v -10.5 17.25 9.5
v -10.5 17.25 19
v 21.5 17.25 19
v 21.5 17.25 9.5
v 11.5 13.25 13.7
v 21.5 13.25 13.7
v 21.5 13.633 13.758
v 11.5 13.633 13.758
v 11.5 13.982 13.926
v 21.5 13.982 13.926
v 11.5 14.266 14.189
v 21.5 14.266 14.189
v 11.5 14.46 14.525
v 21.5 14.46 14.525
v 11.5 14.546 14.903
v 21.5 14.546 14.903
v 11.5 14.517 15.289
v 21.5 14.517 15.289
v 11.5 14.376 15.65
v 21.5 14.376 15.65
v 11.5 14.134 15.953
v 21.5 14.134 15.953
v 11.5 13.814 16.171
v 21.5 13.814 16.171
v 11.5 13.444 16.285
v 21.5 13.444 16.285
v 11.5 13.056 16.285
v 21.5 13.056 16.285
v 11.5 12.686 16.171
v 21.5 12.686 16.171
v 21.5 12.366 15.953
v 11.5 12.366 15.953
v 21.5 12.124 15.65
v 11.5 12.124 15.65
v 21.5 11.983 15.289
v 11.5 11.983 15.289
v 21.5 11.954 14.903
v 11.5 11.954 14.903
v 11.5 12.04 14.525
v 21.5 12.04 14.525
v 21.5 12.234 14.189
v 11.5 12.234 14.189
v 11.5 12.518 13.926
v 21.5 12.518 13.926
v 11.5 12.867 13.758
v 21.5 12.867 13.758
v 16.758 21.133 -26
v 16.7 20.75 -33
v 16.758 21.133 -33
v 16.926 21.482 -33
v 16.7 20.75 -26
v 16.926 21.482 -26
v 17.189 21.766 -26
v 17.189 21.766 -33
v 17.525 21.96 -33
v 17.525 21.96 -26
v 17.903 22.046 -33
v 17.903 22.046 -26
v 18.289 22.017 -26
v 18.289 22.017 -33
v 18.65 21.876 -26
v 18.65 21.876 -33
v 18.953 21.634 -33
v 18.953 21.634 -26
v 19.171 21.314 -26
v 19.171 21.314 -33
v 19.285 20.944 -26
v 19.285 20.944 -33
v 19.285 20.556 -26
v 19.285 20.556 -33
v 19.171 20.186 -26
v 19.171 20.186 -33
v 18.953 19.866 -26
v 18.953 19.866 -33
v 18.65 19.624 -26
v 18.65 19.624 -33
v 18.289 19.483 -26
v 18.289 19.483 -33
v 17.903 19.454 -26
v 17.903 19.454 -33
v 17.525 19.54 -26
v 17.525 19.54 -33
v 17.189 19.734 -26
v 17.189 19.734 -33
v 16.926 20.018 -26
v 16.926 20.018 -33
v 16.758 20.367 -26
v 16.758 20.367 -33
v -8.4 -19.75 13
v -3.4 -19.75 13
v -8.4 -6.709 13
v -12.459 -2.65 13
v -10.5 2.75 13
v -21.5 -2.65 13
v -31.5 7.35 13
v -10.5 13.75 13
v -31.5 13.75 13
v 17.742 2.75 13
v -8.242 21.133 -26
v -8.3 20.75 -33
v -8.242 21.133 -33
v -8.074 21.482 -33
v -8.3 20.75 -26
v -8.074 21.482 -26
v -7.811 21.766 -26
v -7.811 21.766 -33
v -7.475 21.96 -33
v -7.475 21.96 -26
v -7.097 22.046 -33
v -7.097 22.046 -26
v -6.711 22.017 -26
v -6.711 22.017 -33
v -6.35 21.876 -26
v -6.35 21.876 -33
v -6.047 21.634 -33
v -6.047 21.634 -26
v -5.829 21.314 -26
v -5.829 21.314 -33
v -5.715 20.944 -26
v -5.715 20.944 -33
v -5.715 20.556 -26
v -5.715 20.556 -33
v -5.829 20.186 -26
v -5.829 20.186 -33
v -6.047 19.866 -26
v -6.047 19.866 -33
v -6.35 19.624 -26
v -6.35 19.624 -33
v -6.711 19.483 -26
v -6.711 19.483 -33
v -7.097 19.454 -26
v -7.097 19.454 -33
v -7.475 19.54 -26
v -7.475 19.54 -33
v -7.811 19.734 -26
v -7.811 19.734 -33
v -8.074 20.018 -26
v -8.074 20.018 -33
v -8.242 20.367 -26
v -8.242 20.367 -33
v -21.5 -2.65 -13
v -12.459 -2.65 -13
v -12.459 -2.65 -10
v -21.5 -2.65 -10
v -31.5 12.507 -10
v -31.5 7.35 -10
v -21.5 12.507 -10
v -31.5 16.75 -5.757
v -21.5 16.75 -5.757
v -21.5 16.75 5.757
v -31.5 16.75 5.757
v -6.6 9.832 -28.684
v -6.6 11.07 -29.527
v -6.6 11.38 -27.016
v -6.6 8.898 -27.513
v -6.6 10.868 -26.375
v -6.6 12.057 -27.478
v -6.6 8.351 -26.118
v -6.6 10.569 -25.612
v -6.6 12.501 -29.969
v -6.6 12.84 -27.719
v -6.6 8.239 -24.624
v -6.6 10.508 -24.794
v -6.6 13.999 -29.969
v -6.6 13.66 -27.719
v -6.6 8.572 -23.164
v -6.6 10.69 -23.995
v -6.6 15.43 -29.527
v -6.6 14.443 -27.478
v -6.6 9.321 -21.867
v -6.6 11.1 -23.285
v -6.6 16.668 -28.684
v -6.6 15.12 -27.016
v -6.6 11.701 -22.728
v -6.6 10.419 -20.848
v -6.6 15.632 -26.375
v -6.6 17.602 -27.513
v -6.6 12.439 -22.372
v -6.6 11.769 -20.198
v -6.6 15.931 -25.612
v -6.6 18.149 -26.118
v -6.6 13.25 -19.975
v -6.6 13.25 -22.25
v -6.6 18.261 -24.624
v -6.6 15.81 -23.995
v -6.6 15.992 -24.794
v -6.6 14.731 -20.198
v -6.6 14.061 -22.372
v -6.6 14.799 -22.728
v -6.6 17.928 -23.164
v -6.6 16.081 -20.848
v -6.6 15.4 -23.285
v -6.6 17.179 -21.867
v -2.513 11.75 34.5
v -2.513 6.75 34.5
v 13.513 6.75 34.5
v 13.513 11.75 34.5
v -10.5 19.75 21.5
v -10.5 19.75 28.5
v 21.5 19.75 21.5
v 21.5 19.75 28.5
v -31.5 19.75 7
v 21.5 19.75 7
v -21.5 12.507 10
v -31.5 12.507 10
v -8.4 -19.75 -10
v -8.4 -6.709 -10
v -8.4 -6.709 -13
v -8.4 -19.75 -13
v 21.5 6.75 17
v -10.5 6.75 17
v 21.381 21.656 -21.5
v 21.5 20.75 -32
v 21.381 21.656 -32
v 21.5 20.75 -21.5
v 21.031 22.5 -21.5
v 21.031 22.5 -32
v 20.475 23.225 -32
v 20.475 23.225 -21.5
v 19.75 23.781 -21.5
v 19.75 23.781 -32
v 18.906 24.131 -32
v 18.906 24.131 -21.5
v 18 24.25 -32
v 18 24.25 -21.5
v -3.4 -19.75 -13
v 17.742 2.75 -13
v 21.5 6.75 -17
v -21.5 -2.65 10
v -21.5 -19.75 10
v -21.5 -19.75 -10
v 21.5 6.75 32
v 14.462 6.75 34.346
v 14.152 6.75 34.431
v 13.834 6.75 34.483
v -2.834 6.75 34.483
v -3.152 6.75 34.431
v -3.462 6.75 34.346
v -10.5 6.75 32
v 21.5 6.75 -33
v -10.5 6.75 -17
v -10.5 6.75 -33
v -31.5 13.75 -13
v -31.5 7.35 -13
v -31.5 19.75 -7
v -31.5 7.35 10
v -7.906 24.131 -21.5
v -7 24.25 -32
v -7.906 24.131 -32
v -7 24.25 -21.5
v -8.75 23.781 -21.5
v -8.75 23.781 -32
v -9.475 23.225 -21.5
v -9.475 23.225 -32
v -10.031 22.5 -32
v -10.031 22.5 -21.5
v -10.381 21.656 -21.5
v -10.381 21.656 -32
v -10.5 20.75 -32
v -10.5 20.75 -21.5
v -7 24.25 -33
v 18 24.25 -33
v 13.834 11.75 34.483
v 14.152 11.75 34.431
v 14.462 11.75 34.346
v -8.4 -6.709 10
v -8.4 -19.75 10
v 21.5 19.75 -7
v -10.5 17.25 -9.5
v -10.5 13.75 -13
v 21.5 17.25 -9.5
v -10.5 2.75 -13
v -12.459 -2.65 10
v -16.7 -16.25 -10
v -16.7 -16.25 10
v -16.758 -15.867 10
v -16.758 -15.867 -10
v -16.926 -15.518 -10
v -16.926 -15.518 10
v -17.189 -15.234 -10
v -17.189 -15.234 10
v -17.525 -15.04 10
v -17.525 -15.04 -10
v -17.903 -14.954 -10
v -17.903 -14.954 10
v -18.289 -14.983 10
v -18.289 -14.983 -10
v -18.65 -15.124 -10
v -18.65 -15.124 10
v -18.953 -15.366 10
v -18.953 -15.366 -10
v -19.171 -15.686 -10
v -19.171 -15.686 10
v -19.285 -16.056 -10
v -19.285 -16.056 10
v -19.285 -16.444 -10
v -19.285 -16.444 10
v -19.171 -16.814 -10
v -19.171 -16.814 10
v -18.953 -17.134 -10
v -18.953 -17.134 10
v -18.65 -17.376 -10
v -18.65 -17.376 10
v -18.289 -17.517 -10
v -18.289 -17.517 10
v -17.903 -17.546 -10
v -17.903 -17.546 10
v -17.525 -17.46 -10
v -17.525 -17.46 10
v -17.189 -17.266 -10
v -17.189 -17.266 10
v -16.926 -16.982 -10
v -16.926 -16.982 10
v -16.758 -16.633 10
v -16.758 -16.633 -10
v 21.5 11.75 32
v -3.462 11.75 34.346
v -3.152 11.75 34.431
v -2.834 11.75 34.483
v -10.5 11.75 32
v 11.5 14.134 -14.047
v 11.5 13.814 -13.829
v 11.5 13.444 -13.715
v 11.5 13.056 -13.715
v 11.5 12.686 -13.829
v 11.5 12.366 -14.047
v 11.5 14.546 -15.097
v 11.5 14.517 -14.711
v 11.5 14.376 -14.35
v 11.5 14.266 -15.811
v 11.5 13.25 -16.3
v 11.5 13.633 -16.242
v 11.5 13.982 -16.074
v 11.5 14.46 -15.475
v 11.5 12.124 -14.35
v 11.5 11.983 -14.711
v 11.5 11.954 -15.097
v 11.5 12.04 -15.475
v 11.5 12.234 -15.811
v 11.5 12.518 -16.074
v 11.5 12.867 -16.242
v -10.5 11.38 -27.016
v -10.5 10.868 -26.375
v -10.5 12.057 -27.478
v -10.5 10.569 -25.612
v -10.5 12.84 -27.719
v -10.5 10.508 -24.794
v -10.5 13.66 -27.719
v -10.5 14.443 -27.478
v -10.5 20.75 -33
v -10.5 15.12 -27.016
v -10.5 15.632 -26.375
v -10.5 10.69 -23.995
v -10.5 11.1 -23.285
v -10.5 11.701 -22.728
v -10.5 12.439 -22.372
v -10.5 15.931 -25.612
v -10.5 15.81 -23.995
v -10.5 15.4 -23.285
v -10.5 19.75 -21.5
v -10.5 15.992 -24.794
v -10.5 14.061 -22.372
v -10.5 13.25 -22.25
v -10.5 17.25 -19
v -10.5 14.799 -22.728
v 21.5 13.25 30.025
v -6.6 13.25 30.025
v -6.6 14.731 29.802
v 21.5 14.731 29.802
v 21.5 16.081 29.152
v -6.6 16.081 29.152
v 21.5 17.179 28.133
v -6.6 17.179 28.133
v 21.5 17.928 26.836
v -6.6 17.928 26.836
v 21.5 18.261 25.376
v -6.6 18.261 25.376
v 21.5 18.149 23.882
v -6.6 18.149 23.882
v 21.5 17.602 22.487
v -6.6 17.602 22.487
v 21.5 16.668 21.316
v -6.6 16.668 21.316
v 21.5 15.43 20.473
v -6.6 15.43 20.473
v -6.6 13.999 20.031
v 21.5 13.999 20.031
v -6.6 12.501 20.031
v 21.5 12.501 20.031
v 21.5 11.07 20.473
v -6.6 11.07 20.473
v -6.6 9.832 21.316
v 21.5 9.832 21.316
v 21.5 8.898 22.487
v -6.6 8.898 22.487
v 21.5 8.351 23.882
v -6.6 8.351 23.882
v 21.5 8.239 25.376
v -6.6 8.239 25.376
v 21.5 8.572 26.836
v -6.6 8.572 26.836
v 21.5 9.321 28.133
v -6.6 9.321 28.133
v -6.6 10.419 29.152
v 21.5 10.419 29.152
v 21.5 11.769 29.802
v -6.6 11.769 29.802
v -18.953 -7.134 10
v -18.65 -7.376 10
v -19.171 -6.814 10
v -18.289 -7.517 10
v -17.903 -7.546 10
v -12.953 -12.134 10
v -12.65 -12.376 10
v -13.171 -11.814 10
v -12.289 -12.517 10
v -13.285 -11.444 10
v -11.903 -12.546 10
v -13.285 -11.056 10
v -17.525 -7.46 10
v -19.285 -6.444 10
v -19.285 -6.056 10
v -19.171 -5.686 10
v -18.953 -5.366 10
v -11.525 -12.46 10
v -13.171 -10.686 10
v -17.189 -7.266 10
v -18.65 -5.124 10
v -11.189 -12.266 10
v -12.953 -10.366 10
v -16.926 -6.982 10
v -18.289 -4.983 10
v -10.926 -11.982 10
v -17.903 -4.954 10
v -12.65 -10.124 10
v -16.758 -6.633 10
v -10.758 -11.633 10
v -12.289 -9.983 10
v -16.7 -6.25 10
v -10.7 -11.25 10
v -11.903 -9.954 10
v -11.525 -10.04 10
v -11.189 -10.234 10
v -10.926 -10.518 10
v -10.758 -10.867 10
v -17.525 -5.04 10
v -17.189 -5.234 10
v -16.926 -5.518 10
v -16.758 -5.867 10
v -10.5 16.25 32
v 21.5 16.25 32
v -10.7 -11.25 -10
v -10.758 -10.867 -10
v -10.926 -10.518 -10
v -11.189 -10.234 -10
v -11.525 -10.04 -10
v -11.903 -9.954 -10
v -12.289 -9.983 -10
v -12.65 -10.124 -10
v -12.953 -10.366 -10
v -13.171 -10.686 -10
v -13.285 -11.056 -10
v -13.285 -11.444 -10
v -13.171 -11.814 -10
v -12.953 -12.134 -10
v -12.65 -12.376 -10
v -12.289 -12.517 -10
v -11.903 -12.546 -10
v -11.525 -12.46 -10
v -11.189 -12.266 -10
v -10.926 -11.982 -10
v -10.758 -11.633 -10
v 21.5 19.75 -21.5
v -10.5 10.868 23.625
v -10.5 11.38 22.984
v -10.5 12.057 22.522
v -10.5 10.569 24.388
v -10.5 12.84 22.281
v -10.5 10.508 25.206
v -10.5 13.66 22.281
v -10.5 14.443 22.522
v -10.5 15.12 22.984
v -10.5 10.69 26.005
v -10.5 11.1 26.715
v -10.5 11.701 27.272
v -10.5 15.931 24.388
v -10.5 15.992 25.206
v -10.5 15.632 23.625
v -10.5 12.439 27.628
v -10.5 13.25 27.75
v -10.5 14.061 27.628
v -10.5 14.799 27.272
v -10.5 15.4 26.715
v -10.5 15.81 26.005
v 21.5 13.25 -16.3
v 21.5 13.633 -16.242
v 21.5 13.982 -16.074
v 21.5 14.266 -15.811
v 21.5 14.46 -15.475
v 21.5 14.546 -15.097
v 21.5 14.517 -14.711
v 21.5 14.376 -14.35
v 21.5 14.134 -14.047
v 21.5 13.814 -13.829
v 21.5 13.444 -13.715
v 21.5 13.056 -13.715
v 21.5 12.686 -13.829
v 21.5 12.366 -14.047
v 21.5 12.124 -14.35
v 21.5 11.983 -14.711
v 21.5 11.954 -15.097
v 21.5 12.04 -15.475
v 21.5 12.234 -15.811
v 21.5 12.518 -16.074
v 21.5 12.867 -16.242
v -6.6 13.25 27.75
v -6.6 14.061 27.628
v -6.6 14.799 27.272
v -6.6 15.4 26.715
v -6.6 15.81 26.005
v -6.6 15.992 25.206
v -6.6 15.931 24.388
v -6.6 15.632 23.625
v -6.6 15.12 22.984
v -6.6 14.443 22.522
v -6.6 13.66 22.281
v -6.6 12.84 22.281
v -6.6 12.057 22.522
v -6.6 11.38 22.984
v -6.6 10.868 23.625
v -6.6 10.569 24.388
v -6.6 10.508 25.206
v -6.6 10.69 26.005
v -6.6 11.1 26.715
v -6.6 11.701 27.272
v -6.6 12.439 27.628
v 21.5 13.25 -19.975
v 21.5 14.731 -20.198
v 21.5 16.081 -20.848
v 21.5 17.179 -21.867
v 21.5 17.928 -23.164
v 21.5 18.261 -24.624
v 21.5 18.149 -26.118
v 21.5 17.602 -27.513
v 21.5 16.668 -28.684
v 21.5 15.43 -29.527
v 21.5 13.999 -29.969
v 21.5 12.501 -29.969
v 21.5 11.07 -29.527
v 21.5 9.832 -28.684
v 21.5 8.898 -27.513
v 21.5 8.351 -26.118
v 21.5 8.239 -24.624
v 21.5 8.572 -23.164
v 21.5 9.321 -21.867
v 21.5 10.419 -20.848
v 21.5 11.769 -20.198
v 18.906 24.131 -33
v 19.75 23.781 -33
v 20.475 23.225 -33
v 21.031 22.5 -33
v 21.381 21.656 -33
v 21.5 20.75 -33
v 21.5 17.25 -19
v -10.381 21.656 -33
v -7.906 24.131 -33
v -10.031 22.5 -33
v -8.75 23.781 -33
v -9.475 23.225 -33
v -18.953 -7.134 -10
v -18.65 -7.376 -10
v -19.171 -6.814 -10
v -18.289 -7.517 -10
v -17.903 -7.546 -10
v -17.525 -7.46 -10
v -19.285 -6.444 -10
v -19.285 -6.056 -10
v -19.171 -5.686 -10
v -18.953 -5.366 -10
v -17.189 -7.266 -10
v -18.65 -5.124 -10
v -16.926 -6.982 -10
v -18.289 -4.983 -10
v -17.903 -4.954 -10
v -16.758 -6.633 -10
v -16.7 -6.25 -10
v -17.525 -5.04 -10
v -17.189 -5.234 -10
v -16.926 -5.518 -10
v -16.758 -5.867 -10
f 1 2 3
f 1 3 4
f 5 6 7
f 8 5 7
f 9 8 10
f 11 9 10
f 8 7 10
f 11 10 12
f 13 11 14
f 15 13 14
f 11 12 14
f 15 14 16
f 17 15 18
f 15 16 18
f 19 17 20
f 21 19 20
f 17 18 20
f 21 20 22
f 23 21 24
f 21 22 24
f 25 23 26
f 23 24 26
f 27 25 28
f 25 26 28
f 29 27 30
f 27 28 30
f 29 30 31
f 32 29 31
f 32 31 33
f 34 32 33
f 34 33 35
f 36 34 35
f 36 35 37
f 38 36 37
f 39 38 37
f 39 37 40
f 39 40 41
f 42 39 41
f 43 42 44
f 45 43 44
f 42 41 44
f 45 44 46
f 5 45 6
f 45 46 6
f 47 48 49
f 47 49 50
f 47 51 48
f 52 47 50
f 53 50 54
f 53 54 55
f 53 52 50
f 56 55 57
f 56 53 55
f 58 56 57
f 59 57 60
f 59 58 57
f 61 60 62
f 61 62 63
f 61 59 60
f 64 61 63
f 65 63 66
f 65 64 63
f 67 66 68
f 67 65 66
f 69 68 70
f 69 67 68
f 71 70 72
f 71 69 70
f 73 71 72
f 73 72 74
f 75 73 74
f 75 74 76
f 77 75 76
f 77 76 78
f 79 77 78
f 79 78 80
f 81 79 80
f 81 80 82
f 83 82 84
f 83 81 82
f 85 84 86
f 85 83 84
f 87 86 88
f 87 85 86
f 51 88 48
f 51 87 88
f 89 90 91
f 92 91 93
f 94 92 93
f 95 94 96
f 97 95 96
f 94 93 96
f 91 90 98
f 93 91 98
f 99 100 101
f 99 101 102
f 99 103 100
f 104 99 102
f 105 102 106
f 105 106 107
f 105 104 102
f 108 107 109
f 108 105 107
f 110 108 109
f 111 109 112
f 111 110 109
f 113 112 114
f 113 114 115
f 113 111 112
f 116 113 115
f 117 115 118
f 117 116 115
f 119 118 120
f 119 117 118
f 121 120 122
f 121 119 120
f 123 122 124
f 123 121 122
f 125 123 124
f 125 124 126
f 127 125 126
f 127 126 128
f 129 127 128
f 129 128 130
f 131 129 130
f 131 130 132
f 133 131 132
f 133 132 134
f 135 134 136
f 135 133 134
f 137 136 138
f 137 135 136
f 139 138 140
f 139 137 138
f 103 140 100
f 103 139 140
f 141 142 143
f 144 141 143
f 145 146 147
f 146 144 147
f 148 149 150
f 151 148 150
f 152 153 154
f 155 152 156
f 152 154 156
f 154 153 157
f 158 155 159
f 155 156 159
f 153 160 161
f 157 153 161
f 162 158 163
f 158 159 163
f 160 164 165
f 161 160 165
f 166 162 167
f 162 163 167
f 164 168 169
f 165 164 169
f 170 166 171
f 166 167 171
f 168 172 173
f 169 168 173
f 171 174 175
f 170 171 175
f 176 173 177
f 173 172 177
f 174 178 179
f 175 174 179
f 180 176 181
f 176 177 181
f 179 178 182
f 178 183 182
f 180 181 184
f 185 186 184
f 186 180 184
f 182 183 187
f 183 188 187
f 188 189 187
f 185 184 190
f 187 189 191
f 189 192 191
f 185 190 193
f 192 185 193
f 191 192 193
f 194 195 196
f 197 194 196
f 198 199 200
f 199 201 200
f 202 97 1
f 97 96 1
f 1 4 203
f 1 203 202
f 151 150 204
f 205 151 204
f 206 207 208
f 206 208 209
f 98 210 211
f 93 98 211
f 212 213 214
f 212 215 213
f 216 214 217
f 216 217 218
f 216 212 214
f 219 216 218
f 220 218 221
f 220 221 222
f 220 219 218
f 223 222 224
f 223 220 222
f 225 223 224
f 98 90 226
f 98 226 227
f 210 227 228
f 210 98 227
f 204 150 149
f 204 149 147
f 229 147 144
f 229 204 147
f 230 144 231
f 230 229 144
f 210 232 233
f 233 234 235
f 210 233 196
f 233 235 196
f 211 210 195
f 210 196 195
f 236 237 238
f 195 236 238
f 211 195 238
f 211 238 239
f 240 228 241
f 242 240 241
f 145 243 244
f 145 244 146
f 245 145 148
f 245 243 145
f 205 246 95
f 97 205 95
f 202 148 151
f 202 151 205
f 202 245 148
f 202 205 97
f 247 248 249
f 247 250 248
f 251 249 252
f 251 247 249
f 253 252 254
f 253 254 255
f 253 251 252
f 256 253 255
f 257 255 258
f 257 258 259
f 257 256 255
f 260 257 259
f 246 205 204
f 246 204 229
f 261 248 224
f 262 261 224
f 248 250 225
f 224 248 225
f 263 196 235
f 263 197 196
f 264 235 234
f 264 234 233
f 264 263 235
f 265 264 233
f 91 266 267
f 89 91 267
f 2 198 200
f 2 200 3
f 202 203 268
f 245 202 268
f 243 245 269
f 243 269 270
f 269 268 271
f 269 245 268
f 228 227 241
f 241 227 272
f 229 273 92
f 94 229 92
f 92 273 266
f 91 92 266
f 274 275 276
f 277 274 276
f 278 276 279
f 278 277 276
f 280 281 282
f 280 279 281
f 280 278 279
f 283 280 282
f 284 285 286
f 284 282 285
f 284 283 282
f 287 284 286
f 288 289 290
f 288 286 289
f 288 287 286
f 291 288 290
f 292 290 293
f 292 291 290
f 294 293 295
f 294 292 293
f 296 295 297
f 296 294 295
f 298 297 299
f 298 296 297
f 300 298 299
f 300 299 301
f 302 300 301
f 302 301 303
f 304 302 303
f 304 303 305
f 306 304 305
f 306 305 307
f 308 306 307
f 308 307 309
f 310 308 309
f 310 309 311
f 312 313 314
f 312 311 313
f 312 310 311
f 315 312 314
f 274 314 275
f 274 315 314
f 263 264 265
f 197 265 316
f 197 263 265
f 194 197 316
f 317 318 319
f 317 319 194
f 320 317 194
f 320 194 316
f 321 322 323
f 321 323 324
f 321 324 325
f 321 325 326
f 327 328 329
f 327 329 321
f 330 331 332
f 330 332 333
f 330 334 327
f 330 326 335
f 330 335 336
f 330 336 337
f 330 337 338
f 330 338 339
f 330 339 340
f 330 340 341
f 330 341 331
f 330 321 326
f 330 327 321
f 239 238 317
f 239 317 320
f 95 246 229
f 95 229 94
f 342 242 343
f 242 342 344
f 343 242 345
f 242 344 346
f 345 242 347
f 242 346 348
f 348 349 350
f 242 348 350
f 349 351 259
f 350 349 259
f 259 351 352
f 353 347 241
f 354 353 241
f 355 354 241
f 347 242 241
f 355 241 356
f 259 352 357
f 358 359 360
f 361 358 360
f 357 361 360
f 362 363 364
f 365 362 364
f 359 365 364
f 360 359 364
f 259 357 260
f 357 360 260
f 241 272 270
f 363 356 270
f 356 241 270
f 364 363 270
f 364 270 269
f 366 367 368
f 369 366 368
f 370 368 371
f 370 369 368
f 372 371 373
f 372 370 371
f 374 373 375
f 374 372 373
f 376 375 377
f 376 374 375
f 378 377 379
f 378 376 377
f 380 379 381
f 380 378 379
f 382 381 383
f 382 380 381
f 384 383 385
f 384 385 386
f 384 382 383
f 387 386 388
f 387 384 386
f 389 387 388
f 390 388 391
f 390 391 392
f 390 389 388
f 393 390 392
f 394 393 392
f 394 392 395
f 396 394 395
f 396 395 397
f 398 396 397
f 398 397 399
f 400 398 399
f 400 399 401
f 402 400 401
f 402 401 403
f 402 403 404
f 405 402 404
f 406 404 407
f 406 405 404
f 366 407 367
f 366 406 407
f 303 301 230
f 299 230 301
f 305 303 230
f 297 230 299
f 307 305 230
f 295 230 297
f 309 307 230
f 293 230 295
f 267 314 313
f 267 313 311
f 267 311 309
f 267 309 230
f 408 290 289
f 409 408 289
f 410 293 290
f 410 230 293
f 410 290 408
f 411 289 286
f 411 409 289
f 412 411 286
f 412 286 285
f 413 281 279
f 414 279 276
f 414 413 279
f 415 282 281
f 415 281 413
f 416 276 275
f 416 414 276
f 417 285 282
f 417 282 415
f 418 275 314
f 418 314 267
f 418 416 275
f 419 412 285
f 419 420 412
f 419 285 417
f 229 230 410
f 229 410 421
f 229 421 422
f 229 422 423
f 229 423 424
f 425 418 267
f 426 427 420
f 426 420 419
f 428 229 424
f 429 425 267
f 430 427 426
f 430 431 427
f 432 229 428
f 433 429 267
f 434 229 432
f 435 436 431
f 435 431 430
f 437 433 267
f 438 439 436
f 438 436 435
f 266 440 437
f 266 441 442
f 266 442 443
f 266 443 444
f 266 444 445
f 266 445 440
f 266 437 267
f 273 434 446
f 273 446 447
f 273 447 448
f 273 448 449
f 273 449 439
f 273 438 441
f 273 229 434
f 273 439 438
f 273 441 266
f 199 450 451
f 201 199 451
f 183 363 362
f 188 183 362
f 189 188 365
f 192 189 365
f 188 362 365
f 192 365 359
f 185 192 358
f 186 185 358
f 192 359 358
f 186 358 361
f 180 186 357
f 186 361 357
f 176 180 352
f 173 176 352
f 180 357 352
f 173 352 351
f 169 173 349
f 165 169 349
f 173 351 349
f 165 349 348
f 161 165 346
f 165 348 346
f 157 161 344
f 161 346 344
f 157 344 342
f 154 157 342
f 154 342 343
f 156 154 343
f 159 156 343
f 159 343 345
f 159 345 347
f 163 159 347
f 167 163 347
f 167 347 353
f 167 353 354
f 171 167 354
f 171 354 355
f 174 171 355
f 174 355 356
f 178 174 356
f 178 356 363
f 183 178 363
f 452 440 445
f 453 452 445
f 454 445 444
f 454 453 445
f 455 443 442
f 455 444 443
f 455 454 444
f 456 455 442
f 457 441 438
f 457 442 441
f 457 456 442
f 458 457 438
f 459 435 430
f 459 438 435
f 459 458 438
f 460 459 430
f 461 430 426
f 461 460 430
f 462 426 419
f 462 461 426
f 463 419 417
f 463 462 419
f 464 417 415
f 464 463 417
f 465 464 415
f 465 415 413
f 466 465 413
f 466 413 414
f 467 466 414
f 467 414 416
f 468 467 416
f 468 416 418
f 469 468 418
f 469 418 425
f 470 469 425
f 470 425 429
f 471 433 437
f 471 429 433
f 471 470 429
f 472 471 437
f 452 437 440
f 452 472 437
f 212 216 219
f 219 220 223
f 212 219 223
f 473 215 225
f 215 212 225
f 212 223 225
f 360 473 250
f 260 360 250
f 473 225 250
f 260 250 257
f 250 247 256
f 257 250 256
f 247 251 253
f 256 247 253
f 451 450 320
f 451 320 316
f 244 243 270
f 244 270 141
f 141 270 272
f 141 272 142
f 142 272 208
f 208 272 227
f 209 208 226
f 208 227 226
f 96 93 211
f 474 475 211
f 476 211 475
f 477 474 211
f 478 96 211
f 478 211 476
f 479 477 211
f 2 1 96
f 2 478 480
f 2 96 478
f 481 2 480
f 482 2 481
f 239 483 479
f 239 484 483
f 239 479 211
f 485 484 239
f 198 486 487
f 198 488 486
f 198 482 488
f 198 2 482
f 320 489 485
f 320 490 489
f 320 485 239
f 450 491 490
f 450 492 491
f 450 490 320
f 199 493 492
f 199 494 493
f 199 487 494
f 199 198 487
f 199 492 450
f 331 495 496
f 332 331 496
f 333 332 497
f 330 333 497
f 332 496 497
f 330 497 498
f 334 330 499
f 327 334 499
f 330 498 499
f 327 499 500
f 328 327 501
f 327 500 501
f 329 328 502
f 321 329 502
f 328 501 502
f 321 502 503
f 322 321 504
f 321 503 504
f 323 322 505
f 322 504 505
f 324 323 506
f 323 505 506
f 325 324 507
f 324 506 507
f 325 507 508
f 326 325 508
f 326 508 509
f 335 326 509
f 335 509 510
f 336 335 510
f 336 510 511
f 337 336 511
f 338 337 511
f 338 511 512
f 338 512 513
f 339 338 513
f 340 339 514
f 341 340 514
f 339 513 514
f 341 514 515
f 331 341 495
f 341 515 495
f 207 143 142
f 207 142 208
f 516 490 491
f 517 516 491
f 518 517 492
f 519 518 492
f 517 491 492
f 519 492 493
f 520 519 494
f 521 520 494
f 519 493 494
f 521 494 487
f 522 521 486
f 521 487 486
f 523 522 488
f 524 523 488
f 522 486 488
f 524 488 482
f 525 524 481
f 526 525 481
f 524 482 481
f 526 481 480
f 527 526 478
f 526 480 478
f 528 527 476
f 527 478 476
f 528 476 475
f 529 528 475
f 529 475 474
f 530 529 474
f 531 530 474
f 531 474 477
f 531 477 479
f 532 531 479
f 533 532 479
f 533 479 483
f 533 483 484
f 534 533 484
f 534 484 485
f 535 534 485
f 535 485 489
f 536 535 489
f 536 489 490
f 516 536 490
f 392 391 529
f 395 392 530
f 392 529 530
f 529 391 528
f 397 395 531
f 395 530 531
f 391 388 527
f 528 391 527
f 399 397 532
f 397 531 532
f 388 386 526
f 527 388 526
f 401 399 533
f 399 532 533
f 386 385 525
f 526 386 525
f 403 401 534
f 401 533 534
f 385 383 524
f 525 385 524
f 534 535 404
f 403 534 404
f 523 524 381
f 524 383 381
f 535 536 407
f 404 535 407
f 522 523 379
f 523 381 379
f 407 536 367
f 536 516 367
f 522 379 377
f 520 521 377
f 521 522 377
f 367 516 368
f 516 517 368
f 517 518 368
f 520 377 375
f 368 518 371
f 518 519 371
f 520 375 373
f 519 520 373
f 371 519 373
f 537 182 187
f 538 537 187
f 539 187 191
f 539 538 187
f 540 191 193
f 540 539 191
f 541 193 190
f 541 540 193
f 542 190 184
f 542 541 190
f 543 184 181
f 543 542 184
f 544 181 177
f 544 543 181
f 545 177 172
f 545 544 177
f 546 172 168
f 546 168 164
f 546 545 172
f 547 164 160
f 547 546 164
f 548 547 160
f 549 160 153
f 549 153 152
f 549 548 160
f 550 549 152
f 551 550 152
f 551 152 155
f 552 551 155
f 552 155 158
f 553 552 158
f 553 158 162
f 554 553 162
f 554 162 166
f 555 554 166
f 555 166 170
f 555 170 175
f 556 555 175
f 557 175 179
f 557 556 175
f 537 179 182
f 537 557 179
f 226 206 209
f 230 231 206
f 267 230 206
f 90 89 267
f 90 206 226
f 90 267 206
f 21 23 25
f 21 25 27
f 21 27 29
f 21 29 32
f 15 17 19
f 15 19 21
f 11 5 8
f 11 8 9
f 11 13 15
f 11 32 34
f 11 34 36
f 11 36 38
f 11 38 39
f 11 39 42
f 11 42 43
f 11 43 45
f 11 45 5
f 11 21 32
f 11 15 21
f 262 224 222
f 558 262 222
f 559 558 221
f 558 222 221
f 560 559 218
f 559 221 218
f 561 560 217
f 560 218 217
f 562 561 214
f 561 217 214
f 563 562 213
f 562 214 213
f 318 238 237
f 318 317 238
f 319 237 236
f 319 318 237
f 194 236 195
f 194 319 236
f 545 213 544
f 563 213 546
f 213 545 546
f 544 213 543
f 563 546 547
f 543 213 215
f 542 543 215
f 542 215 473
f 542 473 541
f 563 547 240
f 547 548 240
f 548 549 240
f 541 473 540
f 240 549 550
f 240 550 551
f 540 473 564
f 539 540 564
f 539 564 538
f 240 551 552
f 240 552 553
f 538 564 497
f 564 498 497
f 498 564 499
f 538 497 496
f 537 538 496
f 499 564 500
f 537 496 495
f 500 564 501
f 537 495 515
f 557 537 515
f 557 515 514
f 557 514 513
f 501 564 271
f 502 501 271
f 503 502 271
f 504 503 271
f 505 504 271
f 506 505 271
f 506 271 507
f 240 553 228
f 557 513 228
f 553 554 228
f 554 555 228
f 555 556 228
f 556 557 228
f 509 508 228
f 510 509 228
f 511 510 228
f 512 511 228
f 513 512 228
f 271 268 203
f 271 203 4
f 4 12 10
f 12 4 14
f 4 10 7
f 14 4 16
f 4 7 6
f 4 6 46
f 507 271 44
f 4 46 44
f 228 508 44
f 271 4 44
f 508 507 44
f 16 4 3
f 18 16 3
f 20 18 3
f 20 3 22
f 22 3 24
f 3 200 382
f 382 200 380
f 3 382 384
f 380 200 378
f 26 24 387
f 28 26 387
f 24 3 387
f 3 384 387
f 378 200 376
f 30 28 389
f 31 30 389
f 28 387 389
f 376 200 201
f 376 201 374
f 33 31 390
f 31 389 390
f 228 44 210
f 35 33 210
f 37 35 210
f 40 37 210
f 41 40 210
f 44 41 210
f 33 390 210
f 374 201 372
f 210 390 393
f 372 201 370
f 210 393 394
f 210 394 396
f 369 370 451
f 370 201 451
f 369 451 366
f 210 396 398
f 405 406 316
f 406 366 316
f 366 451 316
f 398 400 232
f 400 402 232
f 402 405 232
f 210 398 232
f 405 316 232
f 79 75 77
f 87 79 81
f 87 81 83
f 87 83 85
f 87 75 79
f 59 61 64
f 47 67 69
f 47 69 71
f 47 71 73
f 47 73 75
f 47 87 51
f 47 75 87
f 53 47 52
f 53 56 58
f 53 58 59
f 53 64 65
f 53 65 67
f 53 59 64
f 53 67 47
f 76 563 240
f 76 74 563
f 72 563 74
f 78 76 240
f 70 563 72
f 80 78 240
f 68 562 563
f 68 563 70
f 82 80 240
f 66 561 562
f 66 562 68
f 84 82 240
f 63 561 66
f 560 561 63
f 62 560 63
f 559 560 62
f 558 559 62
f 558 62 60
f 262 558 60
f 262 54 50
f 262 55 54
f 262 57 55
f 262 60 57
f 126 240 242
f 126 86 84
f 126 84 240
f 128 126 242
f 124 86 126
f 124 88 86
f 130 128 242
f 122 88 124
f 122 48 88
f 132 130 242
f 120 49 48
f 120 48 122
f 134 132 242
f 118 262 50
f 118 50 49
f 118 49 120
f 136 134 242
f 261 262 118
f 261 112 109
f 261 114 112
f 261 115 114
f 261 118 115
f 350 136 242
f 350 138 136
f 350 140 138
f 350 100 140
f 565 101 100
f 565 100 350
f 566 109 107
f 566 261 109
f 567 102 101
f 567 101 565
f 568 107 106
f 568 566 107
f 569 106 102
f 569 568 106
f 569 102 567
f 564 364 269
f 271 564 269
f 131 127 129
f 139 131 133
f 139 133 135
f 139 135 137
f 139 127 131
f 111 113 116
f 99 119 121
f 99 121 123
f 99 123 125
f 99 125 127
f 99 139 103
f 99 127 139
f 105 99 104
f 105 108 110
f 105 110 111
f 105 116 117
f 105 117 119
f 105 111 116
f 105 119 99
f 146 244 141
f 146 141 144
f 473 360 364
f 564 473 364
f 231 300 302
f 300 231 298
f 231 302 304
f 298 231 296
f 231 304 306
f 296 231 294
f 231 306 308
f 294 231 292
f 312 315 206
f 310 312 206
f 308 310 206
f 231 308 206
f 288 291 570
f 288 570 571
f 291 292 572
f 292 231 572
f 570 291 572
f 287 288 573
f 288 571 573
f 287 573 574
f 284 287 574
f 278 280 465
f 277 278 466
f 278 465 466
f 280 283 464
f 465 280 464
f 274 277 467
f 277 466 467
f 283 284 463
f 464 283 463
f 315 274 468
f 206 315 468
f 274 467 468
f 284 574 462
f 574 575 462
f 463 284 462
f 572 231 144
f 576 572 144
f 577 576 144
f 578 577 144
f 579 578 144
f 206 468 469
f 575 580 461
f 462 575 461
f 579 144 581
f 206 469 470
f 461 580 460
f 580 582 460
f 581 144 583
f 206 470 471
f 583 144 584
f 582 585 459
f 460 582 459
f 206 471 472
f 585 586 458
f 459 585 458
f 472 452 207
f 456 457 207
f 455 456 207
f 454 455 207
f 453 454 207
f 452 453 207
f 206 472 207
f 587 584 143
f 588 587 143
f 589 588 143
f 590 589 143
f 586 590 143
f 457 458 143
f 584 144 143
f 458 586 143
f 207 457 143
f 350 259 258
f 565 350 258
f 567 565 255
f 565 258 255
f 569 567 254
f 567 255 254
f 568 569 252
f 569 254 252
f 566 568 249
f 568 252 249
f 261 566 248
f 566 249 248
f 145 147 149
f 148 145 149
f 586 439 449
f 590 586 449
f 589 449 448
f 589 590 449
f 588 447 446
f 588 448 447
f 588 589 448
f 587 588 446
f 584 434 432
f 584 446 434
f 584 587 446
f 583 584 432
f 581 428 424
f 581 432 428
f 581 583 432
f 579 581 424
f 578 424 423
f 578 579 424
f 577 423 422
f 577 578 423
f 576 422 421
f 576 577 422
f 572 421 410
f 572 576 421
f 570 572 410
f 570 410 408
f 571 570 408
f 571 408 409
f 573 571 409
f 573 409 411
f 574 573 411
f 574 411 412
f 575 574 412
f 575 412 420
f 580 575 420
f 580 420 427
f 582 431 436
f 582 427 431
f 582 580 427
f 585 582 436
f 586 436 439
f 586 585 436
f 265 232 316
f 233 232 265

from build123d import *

# Parameters (mm, degrees)
SKETCH_1_W               = 43
SKETCH_1_H               = 39.5
EXTRUDE_1_DEPTH          = 10
SKETCH_2_W               = 43
SKETCH_2_H               = 13
EXTRUDE_2_DEPTH          = 32
SKETCH_3_R               = 2.75
CUT_EXTRUDE_4_DEPTH      = 58.123222073
CHAMFER_1_SIZE           = 3.5
CUT_EXTRUDE_3_DEPTH      = 44.316422983
CUT_EXTRUDE_3_DEPTH_BACK = 44.316422983
SKETCH_6_R               = 1.3
EXTRUDE_3_DEPTH          = 3
SKETCH_9_W               = 19
SKETCH_9_H               = 13
CUT_EXTRUDE_6_DEPTH      = 11
CUT_EXTRUDE_7_DEPTH      = 54.640586313
CHAMFER_2_SIZE           = 6
CUT_EXTRUDE_START        = -32
SKETCH_12_R              = 5.025
CUT_EXTRUDE_10_DEPTH     = 28.1
EXTRUDE_4_DEPTH          = 10
CHAMFER_5_SIZE           = 10
CUT_EXTRUDE_11_DEPTH     = 50.376740476
CHAMFER_7_SIZE           = 4
SKETCH_15_R              = 1.3
CUT_EXTRUDE_12_DEPTH     = 10
SKETCH_21_W              = 32
SKETCH_21_H              = 4.5
EXTRUDE_7_DEPTH          = 10.5
SKETCH_21_3_R            = 1.3
CUT_EXTRUDE_15_DEPTH     = 6
FILLET_2_R               = 3.5
SKETCH_22_R              = 1.3
EXTRUDE_8_DEPTH          = 1
EXTRUDE_9_DEPTH          = 5
FILLET_3_R               = 3


with BuildPart() as part:
    # 草图1 → 凸台-拉伸1 (new, symmetric)
    with BuildSketch(Plane.XY):
        Rectangle(SKETCH_1_W, SKETCH_1_H)
    extrude(amount=EXTRUDE_1_DEPTH, both=True)

    # 草图2 → 凸台-拉伸2 (add, symmetric)
    with BuildSketch(Plane.XY):
        with Locations((0, 13.25)):
            Rectangle(SKETCH_2_W, SKETCH_2_H)
    extrude(amount=EXTRUDE_2_DEPTH, both=True)

    # 草图3 → 切除-拉伸4 (cut, through all)
    with BuildSketch(Plane.ZY.offset(21.5)):
        with Locations((-25, 13.25)):
            Circle(SKETCH_3_R)
        with Locations((25, 13.25)):
            Circle(SKETCH_3_R)
    extrude(amount=-CUT_EXTRUDE_4_DEPTH, mode=Mode.SUBTRACT)

    # 倒角1
    chamfer_1_edges = [part.edges().sort_by_distance(p)[0] for p in [
        (0, 19.75, 32),
    ]]
    chamfer(chamfer_1_edges, length=CHAMFER_1_SIZE)

    # 草图6 → 切除-拉伸3 (cut, two sides: drawn at the far end of the back side and taken through both)
    with BuildSketch(Plane.XY.offset(-CUT_EXTRUDE_3_DEPTH_BACK)):
        with Locations((-18, -6.25)):
            Circle(SKETCH_6_R)
        with Locations((-18, -16.25)):
            Circle(SKETCH_6_R)
        with Locations((-12, -11.25)):
            Circle(SKETCH_6_R)
    extrude(amount=CUT_EXTRUDE_3_DEPTH + CUT_EXTRUDE_3_DEPTH_BACK, mode=Mode.SUBTRACT)

    # 草图7 → 凸台-拉伸3 (add)
    with BuildSketch(Plane.XY.offset(10)):
        Polygon((-21.5, -2.65), (-12.458578644, -2.65), (-8.4, -6.708578644), (-8.4, -19.75), (21.5, -19.75), (21.5, 6.75), (-21.5, 6.75), align=None)
    extrude_3 = extrude(amount=EXTRUDE_3_DEPTH)

    # 镜向3: 凸台-拉伸3 across plane
    add(extrude_3.mirror(Plane.XY))

    # 草图9 → 切除-拉伸6 (cut)
    with BuildSketch(Plane.ZY.offset(21.5)):
        with Locations((-22.5, 13.25)):
            Rectangle(SKETCH_9_W, SKETCH_9_H)
        with Locations((22.5, 13.25)):
            Rectangle(SKETCH_9_W, SKETCH_9_H)
    extrude(amount=-CUT_EXTRUDE_6_DEPTH, mode=Mode.SUBTRACT)

    # 草图10 → 切除-拉伸7 (cut, through all)
    with BuildSketch(Plane.XY.offset(13)):
        Polygon((-3.4, -19.75), (21.5, 6.75), (21.5, -19.75), align=None)
    extrude(amount=-CUT_EXTRUDE_7_DEPTH, mode=Mode.SUBTRACT)

    # 倒角2
    chamfer_2_edges = [part.edges().sort_by_distance(p)[0] for p in [
        (-16, 19.75, -13),
        (-16, 19.75, 13),
    ]]
    chamfer(chamfer_2_edges, length=CHAMFER_2_SIZE)

    # 草图12 → 切除-拉伸10 (cut)
    with BuildSketch(Plane.ZY.offset(10.5).offset(CUT_EXTRUDE_START)):
        with Locations((25, 13.25)):
            Circle(SKETCH_12_R)
        with Locations((-25, 13.25)):
            Circle(SKETCH_12_R)
    extrude(amount=CUT_EXTRUDE_10_DEPTH, mode=Mode.SUBTRACT)

    # 草图13 → 凸台-拉伸4 (add)
    with BuildSketch(Plane.ZY.offset(21.5)):
        Polygon((-13, -2.65), (-10, -2.65), (-10, 12.507359313), (-5.757359313, 16.75), (5.757359313, 16.75), (10, 12.507359313), (10, -2.65), (13, -2.65), (13, 13.75), (7, 19.75), (-7, 19.75), (-13, 13.75), align=None)
    extrude(amount=EXTRUDE_4_DEPTH)

    # 倒角5
    chamfer_5_edges = [part.edges().sort_by_distance(p)[0] for p in [
        (-31.5, -2.65, 11.5),
        (-31.5, -2.65, -11.5),
    ]]
    chamfer(chamfer_5_edges, length=CHAMFER_5_SIZE)

    # 草图14 → 切除-拉伸11 (cut, through all)
    with BuildSketch(Plane.ZY.offset(10.5)):
        Polygon((-21.5, 19.75), (-19, 17.25), (-9.5, 17.25), (-7, 19.75), align=None)
        Polygon((9.5, 17.25), (7, 19.75), (21.5, 19.75), (19, 17.25), align=None)
    extrude(amount=-CUT_EXTRUDE_11_DEPTH, mode=Mode.SUBTRACT)

    # 倒角7
    chamfer_7_edges = [part.edges().sort_by_distance(p)[0] for p in [
        (5.5, 6.75, 13),
        (5.5, 6.75, -13),
    ]]
    chamfer(chamfer_7_edges, length=CHAMFER_7_SIZE)

    # 草图15 → 切除-拉伸12 (cut)
    with BuildSketch(Plane(origin=(21.5, 0, 0), x_dir=(0, 0, -1), z_dir=(1, 0, 0))):
        with Locations((-15, 13.25)):
            Circle(SKETCH_15_R)
        with Locations((15, 13.25)):
            Circle(SKETCH_15_R)
    extrude(amount=-CUT_EXTRUDE_12_DEPTH, mode=Mode.SUBTRACT)

    # 草图21 → 凸台-拉伸7 (add)
    with BuildSketch(Plane(origin=(0, 0, -32), x_dir=(-1, 0, 0), z_dir=(0, 0, -1))):
        with Locations((-5.5, 22)):
            Rectangle(SKETCH_21_W, SKETCH_21_H)
    extrude(amount=-EXTRUDE_7_DEPTH)

    # 草图21<3> → 切除-拉伸15 (cut)
    with BuildSketch(Plane(origin=(0, 0, -32), x_dir=(-1, 0, 0), z_dir=(0, 0, -1))):
        with Locations((7, 20.75)):
            Circle(SKETCH_21_3_R)
        with Locations((-18, 20.75)):
            Circle(SKETCH_21_3_R)
    extrude(amount=-CUT_EXTRUDE_15_DEPTH, mode=Mode.SUBTRACT)

    # 圆角2
    fillet_2_edges = [part.edges().sort_by_distance(p)[0] for p in [
        (21.5, 24.25, -26.75),
        (-10.5, 24.25, -26.75),
    ]]
    fillet(fillet_2_edges, radius=FILLET_2_R)

    # 草图22 → 凸台-拉伸8 (add)
    with BuildSketch(Plane(origin=(0, 0, -32), x_dir=(-1, 0, 0), z_dir=(0, 0, -1))):
        with BuildLine():
            Line((10.5, 6.75), (10.5, 20.75))
            ThreePointArc((10.5, 20.75), (9.474873734, 23.224873734), (7, 24.25))
            Line((7, 24.25), (-18, 24.25))
            ThreePointArc((-18, 24.25), (-20.474873734, 23.224873734), (-21.5, 20.75))
            Line((-21.5, 20.75), (-21.5, 6.75))
            Line((-21.5, 6.75), (10.5, 6.75))
        make_face()
        with Locations((7, 20.75)):
            Circle(SKETCH_22_R, mode=Mode.SUBTRACT)
        with Locations((-18, 20.75)):
            Circle(SKETCH_22_R, mode=Mode.SUBTRACT)
    extrude(amount=EXTRUDE_8_DEPTH)

    # 草图24 → 凸台-拉伸9 (add)
    with BuildSketch(Plane.XZ.offset(-6.75)):
        Polygon((-10.5, 32), (-4.5, 34), (-3, 34.5), (14, 34.5), (15.5, 34), (21.5, 32), align=None)
    extrude(amount=-EXTRUDE_9_DEPTH)

    # 圆角3
    fillet_3_edges = [part.edges().sort_by_distance(p)[0] for p in [
        (-3, 9.25, 34.5),
        (14, 9.25, 34.5),
    ]]
    fillet(fillet_3_edges, radius=FILLET_3_R)


solid = part.part
